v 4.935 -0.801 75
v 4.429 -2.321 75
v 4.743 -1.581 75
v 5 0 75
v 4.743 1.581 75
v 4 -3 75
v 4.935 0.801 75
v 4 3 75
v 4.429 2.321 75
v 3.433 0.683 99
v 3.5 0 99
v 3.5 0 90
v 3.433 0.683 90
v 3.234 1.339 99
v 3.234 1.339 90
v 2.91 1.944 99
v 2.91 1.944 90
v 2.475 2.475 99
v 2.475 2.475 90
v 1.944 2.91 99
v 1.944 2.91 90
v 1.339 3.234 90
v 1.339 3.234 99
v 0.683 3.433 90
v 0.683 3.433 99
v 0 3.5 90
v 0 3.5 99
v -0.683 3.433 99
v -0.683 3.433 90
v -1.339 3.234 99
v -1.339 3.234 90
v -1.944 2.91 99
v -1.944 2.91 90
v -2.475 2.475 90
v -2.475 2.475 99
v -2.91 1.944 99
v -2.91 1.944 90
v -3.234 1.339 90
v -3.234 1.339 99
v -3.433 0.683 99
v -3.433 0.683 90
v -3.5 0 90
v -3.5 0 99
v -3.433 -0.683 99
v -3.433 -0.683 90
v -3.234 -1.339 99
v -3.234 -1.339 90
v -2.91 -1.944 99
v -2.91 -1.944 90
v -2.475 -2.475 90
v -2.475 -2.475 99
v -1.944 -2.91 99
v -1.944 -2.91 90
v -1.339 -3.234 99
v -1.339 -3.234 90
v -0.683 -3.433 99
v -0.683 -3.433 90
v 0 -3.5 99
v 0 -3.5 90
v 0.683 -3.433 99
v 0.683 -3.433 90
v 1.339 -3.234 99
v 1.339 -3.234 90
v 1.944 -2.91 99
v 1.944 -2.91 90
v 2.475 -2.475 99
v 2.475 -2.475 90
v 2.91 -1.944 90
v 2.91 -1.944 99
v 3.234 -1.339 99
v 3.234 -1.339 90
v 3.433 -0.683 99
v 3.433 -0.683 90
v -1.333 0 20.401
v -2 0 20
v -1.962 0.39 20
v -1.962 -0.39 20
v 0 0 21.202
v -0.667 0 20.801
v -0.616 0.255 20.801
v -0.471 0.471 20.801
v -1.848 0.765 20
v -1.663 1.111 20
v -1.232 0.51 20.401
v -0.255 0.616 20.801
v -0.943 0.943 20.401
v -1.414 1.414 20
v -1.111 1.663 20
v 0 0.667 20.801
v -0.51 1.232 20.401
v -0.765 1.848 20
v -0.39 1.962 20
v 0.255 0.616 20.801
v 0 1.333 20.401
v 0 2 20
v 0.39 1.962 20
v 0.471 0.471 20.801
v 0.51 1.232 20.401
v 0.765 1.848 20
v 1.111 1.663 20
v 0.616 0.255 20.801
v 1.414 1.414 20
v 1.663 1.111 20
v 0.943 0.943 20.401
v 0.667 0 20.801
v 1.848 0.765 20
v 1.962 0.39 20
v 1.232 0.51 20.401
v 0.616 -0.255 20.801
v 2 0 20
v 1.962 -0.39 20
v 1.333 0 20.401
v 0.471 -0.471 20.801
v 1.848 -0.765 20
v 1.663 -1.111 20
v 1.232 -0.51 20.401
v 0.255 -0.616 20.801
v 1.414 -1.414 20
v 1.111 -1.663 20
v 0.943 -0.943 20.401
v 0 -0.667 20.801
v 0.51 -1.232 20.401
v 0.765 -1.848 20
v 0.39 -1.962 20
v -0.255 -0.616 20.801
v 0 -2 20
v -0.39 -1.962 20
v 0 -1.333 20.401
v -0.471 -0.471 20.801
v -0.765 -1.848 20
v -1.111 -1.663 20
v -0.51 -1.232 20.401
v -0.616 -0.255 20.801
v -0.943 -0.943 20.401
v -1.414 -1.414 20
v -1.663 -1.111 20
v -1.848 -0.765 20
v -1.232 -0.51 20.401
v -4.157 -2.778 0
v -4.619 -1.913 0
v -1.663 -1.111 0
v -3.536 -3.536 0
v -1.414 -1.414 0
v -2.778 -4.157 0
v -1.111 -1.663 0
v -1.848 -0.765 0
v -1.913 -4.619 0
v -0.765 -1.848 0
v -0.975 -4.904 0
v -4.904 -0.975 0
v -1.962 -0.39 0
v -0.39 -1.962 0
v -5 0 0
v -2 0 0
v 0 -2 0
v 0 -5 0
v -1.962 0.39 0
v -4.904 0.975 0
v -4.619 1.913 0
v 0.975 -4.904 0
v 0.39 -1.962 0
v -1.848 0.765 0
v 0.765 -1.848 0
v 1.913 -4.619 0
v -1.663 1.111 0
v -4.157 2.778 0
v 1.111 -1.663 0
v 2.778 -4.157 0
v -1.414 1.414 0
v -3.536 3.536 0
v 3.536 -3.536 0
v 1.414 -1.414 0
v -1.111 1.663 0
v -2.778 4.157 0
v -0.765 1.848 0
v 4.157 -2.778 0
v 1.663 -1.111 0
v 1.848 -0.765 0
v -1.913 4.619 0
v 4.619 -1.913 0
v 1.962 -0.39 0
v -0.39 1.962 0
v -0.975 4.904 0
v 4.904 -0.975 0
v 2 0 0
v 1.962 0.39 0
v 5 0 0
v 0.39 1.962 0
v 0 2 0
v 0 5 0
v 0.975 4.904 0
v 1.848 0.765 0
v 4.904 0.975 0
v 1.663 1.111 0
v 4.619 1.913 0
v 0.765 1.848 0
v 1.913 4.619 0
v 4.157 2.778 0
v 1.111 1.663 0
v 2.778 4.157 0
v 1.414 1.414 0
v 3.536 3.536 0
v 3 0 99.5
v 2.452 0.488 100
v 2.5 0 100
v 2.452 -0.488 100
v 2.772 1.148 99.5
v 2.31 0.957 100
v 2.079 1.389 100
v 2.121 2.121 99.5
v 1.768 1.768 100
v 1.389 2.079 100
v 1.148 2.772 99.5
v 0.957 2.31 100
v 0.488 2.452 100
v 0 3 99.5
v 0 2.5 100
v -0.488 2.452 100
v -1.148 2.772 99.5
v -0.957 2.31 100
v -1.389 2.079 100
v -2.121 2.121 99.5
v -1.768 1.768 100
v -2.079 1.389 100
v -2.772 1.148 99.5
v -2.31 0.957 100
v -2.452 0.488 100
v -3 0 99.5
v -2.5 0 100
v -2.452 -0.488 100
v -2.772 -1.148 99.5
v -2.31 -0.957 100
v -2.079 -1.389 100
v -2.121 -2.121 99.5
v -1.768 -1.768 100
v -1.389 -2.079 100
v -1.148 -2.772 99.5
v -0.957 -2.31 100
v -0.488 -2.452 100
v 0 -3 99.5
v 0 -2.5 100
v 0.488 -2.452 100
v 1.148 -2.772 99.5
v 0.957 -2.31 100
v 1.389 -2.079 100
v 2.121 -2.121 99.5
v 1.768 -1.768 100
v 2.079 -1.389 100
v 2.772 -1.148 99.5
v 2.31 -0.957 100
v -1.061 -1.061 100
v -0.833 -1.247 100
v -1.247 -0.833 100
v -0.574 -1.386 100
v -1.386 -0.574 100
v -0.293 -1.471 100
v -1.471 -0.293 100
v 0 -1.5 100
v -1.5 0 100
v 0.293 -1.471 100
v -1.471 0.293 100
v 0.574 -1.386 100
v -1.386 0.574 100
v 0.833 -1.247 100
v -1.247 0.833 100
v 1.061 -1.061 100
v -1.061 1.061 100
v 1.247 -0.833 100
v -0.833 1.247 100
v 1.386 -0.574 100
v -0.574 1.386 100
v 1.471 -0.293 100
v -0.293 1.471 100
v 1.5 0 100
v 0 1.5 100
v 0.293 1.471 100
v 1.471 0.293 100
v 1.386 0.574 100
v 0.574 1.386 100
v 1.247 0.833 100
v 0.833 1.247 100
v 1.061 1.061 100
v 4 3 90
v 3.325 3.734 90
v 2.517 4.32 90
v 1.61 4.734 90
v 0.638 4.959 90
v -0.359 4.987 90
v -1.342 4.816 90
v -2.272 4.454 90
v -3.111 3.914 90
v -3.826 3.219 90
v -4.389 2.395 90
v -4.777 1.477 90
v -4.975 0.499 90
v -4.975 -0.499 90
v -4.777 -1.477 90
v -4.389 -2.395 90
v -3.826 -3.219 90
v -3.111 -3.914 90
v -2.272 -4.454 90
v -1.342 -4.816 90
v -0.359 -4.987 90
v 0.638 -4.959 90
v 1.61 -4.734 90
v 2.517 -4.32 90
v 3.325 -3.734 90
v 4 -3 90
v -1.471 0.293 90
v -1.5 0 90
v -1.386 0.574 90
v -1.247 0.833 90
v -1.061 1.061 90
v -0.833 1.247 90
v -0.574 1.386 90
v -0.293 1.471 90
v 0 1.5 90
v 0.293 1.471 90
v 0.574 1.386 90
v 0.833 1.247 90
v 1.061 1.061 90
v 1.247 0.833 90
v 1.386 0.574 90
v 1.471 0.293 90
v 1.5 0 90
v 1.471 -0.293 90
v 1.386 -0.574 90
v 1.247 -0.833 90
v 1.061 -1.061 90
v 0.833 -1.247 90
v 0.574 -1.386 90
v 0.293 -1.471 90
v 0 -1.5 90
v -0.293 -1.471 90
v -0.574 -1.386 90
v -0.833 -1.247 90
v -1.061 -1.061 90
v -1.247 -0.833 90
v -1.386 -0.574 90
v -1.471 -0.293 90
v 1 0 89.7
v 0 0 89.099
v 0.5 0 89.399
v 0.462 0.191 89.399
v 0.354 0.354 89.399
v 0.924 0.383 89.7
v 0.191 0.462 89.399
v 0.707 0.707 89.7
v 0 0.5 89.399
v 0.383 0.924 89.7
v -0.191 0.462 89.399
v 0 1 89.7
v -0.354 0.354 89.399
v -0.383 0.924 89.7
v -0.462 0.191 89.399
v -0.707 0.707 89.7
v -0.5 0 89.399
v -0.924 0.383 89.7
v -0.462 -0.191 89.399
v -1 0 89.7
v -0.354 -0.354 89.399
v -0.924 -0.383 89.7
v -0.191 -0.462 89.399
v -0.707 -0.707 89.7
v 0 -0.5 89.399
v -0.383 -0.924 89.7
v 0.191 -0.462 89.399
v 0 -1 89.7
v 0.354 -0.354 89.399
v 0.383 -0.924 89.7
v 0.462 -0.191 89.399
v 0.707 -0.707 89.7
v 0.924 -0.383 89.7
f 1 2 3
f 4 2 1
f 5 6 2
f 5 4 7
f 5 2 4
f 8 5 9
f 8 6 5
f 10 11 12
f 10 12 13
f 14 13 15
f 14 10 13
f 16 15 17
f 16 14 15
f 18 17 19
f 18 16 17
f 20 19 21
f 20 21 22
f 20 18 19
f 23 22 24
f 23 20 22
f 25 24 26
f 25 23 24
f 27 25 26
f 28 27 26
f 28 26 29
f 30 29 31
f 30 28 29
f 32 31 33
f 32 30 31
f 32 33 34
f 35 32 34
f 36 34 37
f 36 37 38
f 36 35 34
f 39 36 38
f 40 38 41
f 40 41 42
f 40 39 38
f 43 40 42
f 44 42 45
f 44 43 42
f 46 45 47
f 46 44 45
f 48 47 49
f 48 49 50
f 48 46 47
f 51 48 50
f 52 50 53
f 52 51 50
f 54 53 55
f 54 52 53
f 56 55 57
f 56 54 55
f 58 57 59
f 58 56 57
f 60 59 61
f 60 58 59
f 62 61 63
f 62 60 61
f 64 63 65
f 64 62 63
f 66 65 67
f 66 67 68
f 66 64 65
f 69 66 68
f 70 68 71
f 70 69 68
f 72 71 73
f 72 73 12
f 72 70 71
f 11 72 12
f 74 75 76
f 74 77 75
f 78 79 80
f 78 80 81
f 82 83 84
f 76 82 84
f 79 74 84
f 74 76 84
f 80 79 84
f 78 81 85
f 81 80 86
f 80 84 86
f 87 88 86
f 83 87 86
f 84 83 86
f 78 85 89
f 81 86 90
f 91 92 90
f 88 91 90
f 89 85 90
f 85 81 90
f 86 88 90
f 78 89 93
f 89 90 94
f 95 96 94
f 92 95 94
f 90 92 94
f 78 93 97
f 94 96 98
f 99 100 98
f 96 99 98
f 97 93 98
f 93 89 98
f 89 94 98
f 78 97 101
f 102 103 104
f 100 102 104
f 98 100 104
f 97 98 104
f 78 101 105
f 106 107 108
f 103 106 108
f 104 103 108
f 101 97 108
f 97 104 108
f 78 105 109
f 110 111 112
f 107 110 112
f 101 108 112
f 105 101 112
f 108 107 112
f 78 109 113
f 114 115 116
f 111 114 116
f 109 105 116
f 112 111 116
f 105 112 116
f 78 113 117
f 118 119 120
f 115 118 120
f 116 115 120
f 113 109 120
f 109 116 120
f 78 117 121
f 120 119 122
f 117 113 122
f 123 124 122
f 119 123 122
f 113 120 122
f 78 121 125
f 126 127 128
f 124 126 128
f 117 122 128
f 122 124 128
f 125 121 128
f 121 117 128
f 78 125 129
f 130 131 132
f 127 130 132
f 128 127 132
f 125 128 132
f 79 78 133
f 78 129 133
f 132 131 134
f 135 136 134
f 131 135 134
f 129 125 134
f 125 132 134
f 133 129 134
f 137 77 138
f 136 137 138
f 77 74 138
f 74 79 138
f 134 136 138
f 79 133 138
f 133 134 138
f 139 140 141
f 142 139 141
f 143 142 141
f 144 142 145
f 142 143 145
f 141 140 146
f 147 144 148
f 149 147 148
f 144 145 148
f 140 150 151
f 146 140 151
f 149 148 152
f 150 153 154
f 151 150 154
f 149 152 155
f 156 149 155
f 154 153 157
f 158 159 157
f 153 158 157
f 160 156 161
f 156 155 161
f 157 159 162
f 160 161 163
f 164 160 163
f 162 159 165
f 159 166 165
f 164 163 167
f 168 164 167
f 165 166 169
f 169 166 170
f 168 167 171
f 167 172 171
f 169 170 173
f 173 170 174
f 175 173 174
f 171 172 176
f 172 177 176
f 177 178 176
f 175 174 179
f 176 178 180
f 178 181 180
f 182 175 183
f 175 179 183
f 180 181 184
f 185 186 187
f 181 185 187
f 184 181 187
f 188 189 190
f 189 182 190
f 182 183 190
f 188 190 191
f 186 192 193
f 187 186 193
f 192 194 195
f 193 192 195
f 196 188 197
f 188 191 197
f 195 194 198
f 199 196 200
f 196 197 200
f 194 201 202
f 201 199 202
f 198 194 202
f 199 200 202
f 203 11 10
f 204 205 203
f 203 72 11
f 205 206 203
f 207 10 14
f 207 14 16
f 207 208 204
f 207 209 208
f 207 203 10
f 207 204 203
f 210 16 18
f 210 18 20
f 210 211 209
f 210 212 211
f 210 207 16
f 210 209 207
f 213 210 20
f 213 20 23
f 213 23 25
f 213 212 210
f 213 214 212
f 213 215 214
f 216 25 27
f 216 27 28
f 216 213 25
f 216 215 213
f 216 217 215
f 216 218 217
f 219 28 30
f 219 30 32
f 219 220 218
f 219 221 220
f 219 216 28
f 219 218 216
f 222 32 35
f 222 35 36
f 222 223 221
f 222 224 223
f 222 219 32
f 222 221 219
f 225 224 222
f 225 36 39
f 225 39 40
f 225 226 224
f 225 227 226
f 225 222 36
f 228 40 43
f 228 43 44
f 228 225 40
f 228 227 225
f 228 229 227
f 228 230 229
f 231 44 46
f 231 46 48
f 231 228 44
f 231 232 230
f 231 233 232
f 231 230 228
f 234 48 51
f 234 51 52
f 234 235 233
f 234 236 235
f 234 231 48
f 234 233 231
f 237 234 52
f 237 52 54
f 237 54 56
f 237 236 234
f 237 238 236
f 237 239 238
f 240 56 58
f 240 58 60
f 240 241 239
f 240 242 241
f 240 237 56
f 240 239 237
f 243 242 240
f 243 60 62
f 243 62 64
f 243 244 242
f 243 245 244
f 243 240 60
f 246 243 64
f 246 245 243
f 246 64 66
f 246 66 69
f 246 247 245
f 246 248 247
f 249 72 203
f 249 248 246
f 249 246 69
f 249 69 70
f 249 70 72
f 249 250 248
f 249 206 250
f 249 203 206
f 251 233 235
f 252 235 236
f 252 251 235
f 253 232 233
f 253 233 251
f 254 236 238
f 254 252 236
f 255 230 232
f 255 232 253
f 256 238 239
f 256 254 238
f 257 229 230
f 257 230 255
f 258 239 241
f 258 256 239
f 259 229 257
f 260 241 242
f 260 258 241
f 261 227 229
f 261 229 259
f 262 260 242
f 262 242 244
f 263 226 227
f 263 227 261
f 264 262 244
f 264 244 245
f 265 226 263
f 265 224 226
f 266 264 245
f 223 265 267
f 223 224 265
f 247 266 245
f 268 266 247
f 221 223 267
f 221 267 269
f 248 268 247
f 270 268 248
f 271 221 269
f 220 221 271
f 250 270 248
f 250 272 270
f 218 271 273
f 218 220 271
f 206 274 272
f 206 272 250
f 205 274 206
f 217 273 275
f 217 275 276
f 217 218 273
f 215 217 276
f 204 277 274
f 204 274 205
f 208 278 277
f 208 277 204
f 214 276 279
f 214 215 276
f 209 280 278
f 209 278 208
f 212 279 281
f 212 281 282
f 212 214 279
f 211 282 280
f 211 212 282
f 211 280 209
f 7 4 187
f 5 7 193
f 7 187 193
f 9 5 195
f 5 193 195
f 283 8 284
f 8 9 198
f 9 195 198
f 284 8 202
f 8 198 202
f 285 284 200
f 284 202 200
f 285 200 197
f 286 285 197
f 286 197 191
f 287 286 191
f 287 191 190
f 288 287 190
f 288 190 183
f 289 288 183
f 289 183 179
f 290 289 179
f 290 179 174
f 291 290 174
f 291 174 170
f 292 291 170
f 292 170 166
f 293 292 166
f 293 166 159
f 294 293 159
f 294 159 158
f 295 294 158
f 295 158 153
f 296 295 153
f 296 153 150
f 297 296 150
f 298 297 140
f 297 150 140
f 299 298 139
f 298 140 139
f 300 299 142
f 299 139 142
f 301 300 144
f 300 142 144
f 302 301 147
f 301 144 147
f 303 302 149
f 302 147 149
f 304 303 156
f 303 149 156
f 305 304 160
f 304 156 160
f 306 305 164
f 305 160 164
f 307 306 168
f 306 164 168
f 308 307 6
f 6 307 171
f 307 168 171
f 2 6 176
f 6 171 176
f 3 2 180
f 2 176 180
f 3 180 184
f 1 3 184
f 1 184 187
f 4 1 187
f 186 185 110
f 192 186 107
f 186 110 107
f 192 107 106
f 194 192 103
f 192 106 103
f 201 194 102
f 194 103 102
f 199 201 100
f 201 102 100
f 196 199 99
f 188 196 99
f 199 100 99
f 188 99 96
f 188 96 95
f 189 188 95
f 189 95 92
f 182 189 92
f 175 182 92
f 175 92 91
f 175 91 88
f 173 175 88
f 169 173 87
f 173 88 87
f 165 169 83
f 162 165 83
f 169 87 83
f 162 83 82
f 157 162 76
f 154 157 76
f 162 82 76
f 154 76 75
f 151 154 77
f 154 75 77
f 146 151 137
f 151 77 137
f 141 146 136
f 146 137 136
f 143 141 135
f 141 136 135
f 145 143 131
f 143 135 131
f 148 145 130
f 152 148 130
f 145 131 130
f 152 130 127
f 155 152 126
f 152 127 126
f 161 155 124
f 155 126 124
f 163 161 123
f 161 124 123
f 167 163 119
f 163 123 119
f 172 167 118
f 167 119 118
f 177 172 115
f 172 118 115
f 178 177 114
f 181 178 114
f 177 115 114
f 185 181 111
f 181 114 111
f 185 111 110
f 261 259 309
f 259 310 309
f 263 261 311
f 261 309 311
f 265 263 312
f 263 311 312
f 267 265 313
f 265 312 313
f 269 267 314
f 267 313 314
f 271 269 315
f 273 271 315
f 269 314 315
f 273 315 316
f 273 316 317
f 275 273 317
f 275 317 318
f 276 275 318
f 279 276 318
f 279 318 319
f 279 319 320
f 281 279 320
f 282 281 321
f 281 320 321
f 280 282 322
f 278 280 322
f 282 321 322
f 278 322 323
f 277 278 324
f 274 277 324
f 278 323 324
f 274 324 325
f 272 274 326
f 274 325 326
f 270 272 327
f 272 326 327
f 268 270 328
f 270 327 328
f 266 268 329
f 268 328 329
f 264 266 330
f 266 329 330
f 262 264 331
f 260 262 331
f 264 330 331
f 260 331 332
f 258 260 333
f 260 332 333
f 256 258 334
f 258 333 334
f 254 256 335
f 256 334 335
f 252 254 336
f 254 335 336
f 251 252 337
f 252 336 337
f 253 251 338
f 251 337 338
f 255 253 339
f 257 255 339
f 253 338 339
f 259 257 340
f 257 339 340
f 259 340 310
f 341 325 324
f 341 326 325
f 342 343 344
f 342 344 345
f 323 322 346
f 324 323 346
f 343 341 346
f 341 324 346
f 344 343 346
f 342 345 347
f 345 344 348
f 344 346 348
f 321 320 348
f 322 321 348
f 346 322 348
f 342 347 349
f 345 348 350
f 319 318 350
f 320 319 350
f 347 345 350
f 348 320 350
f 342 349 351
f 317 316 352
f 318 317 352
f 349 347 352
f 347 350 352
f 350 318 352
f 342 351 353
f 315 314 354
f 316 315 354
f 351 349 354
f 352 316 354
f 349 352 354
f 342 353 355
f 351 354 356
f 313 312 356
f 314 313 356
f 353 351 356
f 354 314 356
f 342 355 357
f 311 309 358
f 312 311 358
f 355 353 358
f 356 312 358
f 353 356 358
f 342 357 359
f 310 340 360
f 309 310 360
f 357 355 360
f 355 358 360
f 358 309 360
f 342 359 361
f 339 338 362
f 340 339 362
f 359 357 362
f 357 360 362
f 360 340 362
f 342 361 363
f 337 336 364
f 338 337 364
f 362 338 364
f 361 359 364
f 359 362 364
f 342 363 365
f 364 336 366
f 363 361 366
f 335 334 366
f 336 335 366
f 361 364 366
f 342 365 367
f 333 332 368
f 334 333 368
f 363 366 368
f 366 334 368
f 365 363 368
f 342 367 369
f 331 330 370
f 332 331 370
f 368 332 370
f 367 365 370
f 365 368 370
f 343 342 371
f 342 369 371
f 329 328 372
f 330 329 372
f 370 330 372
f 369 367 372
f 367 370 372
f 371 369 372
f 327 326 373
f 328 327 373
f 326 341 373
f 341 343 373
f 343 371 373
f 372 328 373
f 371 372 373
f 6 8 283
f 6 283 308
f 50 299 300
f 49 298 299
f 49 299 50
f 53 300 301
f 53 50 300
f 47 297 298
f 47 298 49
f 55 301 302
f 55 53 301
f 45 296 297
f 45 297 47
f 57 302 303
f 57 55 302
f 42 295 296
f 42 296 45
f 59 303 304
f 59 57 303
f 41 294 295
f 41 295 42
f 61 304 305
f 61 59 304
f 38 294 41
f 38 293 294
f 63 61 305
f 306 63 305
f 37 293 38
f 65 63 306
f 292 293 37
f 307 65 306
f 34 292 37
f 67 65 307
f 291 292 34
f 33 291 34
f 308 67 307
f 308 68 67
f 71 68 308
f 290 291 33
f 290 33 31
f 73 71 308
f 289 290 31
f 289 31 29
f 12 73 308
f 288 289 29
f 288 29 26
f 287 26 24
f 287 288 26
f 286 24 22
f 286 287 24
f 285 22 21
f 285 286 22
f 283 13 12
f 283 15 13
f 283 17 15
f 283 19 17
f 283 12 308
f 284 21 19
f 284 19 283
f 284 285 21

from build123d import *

# Parameters (mm, degrees)
SKETCH1_R                = 5
BASE_EXTRUDE_DEPTH       = 100
SKETCH7_OUTSIDE_W        = 32.2
SKETCH7_OUTSIDE_H        = 32.2
SKETCH7_OUTSIDE_R        = 3.5
FRONT_CUT_DEPTH          = 10
FRONT_HOLE_D             = 3
FRONT_HOLE_DEPTH         = 10
FRONT_HOLE_TIP           = 0.901290929
CHAMFER1_SIZE            = 1
KEYWAY_START             = -15
KEYWAY_CUT_DEPTH         = 15
F_4_0_4_BLACK_HOLE_D     = 4
F_4_0_4_BLACK_HOLE_DEPTH = 20
F_4_0_4_BLACK_HOLE_TIP   = 1.201721238


with BuildPart() as part:
    # Sketch1 → Base Extrude (new body)
    with BuildSketch(Plane.XY):
        Circle(SKETCH1_R)
    extrude(amount=BASE_EXTRUDE_DEPTH)

    # Sketch7 outside → Front Cut (cut)
    with BuildSketch(Plane.XY.offset(100)):
        Rectangle(SKETCH7_OUTSIDE_W, SKETCH7_OUTSIDE_H)
        Circle(SKETCH7_OUTSIDE_R, mode=Mode.SUBTRACT)
    extrude(amount=-FRONT_CUT_DEPTH, mode=Mode.SUBTRACT)

    # Front Hole
    with Locations(Plane.XY.offset(100)):
        with Locations((0, 0)):
            Hole(FRONT_HOLE_D / 2, depth=FRONT_HOLE_DEPTH)
            with Locations((0, 0, -(FRONT_HOLE_DEPTH + FRONT_HOLE_TIP / 2))):  # 118° drill point
                Cone(0, FRONT_HOLE_D / 2, FRONT_HOLE_TIP, mode=Mode.SUBTRACT)

    # Chamfer1
    chamfer1_edges = [part.edges().sort_by_distance(p)[0] for p in [
        (-3.5, 0, 100),
    ]]
    chamfer(chamfer1_edges, length=CHAMFER1_SIZE)

    # Keyway → Keyway Cut (cut)
    with BuildSketch(Plane.XY.offset(90).offset(KEYWAY_START)):
        with BuildLine():
            Line((4, 3), (4, -3))
            ThreePointArc((4, -3), (5, 0), (4, 3))
        make_face()
    extrude(amount=KEYWAY_CUT_DEPTH, mode=Mode.SUBTRACT)

    # Ø4.0 (4) Black Hole
    with Locations(Plane(origin=(0, 0, 0), x_dir=(-1, 0, 0), z_dir=(0, 0, -1))):
        with Locations((0, 0)):
            Hole(F_4_0_4_BLACK_HOLE_D / 2, depth=F_4_0_4_BLACK_HOLE_DEPTH)
            with Locations((0, 0, -(F_4_0_4_BLACK_HOLE_DEPTH + F_4_0_4_BLACK_HOLE_TIP / 2))):  # 118° drill point
                Cone(0, F_4_0_4_BLACK_HOLE_D / 2, F_4_0_4_BLACK_HOLE_TIP, mode=Mode.SUBTRACT)


solid = part.part
